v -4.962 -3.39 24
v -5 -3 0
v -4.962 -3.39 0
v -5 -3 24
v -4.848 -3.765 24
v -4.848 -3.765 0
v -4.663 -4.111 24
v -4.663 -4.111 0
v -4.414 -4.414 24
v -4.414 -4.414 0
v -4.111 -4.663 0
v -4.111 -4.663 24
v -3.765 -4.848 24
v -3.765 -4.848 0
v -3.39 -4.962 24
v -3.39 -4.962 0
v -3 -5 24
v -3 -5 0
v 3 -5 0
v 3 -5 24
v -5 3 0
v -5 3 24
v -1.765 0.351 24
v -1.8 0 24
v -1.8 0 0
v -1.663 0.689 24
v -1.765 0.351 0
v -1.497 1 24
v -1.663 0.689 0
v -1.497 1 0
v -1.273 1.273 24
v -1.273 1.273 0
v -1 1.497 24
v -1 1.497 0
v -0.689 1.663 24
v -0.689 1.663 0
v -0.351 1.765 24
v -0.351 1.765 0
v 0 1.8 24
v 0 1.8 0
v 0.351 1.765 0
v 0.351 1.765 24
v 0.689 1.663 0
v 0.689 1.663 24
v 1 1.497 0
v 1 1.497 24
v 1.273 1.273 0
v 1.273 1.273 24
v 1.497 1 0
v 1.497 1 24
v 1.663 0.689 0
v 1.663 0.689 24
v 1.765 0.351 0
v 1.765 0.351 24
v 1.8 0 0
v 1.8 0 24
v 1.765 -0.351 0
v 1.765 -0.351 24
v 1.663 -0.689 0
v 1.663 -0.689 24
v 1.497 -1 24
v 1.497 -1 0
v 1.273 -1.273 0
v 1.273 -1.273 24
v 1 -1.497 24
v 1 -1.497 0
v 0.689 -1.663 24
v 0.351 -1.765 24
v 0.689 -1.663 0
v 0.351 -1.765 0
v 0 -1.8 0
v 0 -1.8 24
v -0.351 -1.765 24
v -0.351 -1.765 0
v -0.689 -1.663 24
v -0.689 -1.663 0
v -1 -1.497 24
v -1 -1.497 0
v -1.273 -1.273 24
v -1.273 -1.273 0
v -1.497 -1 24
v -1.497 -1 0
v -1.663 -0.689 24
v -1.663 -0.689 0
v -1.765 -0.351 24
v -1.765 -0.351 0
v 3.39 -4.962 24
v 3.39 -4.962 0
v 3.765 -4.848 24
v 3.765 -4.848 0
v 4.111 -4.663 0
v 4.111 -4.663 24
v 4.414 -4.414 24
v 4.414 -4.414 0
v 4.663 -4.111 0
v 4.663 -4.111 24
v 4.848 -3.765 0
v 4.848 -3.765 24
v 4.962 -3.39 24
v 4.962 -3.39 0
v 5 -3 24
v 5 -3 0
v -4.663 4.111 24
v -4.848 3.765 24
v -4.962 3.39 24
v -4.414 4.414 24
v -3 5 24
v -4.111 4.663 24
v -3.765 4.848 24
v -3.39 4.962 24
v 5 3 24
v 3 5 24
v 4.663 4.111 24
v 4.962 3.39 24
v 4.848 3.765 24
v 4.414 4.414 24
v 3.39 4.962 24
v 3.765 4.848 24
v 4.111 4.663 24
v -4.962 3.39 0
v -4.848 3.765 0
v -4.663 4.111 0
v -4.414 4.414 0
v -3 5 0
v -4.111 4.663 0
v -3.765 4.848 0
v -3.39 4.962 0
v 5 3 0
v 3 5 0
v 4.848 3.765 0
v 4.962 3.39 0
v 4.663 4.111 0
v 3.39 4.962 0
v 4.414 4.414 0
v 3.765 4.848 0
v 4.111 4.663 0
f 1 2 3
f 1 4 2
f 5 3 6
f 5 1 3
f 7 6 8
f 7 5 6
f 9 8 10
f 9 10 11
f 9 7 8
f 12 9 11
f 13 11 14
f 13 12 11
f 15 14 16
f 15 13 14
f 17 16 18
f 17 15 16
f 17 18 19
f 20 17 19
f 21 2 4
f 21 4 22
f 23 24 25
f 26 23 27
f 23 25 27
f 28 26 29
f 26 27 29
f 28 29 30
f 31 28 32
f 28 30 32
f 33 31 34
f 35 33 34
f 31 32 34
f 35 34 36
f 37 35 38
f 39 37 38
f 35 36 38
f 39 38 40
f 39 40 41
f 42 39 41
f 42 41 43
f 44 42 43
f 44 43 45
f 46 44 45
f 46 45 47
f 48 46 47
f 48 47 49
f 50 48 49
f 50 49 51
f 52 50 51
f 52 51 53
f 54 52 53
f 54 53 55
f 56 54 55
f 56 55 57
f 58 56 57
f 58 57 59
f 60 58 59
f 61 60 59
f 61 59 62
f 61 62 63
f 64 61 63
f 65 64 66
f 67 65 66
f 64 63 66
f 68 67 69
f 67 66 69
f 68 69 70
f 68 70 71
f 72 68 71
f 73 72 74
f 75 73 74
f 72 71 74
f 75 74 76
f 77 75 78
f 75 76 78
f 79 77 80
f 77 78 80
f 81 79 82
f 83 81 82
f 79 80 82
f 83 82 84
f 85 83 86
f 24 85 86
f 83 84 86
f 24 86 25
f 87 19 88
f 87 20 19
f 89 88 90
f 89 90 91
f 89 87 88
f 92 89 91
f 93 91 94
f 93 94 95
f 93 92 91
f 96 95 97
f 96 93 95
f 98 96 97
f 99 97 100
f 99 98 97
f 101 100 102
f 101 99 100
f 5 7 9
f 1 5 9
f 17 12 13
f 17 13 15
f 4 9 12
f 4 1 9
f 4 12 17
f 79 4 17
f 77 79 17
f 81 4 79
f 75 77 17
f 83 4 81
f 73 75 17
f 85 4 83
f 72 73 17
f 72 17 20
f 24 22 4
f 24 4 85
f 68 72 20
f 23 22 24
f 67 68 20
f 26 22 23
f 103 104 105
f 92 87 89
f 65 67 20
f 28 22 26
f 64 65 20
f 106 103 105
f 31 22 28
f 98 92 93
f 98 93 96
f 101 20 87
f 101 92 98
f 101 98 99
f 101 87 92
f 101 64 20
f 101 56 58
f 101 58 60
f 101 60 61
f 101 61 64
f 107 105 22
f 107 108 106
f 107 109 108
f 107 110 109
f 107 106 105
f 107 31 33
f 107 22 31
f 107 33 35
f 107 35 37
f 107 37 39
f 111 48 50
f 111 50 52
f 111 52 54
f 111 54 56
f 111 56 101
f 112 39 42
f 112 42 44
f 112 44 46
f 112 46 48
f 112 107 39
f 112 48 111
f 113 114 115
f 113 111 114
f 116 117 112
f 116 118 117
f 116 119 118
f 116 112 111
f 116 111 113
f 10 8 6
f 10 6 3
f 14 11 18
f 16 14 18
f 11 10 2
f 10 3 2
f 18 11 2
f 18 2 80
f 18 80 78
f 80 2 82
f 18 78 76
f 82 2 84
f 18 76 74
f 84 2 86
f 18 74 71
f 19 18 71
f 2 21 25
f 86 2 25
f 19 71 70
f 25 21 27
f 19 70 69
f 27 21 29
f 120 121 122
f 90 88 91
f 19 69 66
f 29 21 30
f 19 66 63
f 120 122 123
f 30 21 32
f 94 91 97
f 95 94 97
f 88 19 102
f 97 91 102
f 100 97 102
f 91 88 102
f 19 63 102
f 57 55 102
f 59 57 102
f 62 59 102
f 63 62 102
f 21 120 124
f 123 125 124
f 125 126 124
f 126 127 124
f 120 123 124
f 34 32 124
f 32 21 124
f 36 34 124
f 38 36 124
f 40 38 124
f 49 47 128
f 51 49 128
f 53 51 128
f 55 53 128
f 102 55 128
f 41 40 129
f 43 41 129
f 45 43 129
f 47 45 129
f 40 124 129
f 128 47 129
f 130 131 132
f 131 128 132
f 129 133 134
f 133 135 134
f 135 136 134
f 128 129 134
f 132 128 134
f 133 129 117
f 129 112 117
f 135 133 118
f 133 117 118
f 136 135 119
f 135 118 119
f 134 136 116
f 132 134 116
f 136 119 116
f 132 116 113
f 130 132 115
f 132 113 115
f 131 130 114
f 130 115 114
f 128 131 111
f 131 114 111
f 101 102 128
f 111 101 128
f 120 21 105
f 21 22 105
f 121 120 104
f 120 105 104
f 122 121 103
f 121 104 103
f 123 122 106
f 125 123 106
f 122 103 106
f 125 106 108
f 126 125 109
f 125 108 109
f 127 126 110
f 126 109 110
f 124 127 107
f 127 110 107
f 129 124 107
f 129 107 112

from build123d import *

# Parameters (mm, degrees)
SKETCH1_W            = 10
SKETCH1_H            = 10
BOSS_EXTRUDE1_DEPTH  = 24
M3_CLEARANCE_HOLE1_D = 3.6
FILLET1_R            = 2


with BuildPart() as part:
    # Sketch1 → Boss-Extrude1 (new body)
    with BuildSketch(Plane.XY):
        Rectangle(SKETCH1_W, SKETCH1_H)
    extrude(amount=BOSS_EXTRUDE1_DEPTH)

    # M3 Clearance Hole1 (through all)
    with Locations(Plane.XY.offset(24)):
        with Locations((0, 0)):
            Hole(M3_CLEARANCE_HOLE1_D / 2)

    # Fillet1
    fillet1_edges = [part.edges().sort_by_distance(p)[0] for p in [
        (5, -5, 12),
        (-5, -5, 12),
        (-5, 5, 12),
        (5, 5, 12),
    ]]
    fillet(fillet1_edges, radius=FILLET1_R)


solid = part.part
